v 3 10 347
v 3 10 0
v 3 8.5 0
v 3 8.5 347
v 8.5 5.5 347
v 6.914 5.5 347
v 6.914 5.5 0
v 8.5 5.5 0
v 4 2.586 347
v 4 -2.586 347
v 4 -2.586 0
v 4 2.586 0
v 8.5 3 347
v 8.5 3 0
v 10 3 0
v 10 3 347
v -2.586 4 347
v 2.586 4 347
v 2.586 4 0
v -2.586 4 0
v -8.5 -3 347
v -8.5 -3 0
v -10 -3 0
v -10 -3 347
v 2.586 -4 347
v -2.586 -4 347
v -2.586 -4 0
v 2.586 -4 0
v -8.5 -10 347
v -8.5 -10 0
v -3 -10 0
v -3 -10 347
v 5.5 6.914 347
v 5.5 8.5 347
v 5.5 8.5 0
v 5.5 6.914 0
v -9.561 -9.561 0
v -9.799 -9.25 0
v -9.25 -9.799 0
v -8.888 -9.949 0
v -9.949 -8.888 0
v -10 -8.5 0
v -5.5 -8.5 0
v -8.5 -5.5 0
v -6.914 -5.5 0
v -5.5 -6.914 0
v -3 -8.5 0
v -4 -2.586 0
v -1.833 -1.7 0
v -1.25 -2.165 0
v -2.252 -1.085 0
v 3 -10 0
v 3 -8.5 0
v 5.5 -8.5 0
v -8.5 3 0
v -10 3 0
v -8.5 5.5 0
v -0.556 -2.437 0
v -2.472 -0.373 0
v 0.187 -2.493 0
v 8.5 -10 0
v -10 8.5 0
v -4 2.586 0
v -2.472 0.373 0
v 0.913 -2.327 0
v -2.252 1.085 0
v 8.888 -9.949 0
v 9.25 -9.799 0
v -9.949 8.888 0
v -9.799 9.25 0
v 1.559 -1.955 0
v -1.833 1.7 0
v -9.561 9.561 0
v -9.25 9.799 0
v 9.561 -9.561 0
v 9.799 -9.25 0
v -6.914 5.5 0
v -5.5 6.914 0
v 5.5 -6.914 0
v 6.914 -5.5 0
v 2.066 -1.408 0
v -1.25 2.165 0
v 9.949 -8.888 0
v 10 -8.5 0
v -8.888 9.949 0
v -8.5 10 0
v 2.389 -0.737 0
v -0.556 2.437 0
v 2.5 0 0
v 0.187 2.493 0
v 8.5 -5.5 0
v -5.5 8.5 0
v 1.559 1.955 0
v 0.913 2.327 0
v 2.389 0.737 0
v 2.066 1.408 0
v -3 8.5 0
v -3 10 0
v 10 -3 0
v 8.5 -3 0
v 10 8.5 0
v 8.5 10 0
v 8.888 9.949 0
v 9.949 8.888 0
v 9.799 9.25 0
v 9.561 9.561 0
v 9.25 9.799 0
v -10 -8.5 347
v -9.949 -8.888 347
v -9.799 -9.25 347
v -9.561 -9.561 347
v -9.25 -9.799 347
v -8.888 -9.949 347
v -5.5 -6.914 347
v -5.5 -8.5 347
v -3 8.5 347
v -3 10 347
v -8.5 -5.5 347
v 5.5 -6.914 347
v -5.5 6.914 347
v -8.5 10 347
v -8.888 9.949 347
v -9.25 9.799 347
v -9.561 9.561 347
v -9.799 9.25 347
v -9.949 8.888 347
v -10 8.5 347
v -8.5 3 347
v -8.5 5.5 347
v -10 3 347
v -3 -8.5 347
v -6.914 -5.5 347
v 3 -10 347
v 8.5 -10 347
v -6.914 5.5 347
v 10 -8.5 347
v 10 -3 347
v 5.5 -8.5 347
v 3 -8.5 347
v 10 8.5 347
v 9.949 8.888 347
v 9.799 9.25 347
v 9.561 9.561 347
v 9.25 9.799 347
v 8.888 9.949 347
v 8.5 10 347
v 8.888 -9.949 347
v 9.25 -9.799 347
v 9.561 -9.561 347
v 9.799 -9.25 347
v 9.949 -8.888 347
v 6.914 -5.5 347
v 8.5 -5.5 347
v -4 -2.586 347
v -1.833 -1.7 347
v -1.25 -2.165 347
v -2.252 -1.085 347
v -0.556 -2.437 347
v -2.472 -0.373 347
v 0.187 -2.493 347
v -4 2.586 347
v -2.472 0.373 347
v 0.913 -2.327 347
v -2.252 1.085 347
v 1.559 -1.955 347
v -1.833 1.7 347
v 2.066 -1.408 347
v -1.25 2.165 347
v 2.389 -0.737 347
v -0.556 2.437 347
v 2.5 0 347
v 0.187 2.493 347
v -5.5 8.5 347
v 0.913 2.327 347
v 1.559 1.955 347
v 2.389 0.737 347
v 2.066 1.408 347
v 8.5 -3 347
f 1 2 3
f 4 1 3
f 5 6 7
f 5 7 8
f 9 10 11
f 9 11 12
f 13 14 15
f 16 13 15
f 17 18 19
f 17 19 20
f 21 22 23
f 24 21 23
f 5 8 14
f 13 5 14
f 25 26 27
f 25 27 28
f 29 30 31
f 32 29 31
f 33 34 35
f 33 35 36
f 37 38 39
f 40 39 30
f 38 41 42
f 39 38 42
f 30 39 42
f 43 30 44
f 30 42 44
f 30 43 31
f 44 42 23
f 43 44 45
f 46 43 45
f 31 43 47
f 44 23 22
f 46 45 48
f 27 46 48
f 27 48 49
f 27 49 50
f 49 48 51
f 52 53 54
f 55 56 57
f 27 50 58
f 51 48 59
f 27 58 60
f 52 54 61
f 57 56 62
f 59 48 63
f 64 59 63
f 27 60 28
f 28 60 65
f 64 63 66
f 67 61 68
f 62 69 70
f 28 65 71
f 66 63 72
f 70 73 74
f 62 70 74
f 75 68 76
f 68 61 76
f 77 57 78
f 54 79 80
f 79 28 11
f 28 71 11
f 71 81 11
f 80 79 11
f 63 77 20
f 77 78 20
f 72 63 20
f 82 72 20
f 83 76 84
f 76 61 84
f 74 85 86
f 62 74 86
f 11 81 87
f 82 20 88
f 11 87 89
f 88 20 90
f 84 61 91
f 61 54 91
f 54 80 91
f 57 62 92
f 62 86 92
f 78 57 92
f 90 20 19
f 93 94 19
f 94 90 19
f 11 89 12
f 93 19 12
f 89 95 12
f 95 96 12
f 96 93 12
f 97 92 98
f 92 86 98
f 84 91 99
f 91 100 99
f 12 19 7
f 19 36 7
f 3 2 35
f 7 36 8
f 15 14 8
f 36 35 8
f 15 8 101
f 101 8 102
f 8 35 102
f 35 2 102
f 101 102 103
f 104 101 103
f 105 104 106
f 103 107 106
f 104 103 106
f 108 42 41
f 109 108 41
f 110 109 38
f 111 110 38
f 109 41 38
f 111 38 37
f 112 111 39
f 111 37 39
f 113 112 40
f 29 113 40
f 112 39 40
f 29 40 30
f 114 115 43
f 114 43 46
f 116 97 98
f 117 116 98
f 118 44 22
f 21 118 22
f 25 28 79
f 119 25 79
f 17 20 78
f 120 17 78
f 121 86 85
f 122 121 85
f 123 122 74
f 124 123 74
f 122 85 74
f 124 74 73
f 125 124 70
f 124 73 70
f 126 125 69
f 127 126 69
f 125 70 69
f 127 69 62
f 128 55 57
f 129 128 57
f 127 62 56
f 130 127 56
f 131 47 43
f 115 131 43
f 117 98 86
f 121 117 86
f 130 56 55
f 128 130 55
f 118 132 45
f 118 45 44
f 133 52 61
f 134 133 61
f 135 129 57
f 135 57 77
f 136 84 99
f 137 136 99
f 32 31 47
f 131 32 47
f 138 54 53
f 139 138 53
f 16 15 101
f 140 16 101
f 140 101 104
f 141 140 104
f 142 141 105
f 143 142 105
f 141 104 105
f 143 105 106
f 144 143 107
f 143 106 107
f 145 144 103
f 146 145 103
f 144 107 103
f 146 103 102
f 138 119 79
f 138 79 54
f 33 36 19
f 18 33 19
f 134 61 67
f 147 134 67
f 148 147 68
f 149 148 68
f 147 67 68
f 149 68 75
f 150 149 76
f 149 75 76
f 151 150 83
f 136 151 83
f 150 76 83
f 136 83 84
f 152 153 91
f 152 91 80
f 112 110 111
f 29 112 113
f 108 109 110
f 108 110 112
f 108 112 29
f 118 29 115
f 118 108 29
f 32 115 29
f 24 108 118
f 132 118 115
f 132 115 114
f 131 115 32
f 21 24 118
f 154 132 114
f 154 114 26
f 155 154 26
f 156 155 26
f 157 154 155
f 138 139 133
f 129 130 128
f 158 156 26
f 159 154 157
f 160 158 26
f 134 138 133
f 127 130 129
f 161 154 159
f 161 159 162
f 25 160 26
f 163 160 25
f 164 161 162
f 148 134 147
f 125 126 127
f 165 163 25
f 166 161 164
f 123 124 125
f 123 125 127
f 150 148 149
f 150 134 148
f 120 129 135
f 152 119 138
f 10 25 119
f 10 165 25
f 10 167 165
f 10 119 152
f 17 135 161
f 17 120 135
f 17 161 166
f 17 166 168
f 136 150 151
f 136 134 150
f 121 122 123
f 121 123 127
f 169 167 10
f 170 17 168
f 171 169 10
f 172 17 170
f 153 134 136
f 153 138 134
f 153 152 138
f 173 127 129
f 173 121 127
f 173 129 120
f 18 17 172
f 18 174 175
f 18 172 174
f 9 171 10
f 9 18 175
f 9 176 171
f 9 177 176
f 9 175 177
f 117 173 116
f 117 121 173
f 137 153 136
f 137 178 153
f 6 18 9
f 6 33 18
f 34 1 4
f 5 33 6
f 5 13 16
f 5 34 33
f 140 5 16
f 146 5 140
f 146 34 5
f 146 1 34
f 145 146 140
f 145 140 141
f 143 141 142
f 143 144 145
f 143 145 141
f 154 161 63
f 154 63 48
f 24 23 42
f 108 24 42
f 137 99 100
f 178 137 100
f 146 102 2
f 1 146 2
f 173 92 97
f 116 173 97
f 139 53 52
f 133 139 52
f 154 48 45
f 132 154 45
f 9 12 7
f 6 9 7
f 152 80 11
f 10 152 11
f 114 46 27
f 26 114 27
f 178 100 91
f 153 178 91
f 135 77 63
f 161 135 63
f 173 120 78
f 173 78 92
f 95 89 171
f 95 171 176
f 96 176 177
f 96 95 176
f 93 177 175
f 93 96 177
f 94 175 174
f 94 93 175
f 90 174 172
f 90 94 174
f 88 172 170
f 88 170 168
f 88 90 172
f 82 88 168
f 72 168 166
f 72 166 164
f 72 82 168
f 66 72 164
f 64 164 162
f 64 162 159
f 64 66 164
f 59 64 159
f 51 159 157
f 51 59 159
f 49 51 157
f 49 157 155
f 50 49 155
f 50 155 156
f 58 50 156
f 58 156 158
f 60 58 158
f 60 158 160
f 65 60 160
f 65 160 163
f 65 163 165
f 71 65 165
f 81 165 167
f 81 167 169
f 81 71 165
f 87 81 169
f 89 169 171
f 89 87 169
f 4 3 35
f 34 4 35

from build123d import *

# Parameters (mm, degrees)
SKETCH1_R           = 2.5
BOSS_EXTRUDE1_DEPTH = 347


with BuildPart() as part:
    # Sketch1 → Boss-Extrude1 (new body)
    with BuildSketch(Plane.XY):
        with BuildLine():
            Line((-2.585786438, 4), (-5.5, 6.914213562))
            Line((-5.5, 6.914213562), (-5.5, 8.5))
            Line((-5.5, 8.5), (-3, 8.5))
            Line((-3, 8.5), (-3, 10))
            Line((-3, 10), (-8.5, 10))
            ThreePointArc((-8.5, 10), (-9.560660172, 9.560660172), (-10, 8.5))
            Line((-10, 8.5), (-10, 3))
            Line((-10, 3), (-8.5, 3))
            Line((-8.5, 3), (-8.5, 5.5))
            Line((-8.5, 5.5), (-6.914213562, 5.5))
            Line((-6.914213562, 5.5), (-4, 2.585786438))
            Line((-4, 2.585786438), (-4, -2.585786438))
            Line((-4, -2.585786438), (-6.914213562, -5.5))
            Line((-6.914213562, -5.5), (-8.5, -5.5))
            Line((-8.5, -5.5), (-8.5, -3))
            Line((-8.5, -3), (-10, -3))
            Line((-10, -3), (-10, -8.5))
            ThreePointArc((-10, -8.5), (-9.560660172, -9.560660172), (-8.5, -10))
            Line((-8.5, -10), (-3, -10))
            Line((-3, -10), (-3, -8.5))
            Line((-3, -8.5), (-5.5, -8.5))
            Line((-5.5, -8.5), (-5.5, -6.914213562))
            Line((-5.5, -6.914213562), (-2.585786438, -4))
            Line((-2.585786438, -4), (2.585786438, -4))
            Line((2.585786438, -4), (5.5, -6.914213562))
            Line((5.5, -6.914213562), (5.5, -8.5))
            Line((5.5, -8.5), (3, -8.5))
            Line((3, -8.5), (3, -10))
            Line((3, -10), (8.5, -10))
            ThreePointArc((8.5, -10), (9.560660172, -9.560660172), (10, -8.5))
            Line((10, -8.5), (10, -3))
            Line((10, -3), (8.5, -3))
            Line((8.5, -3), (8.5, -5.5))
            Line((8.5, -5.5), (6.914213562, -5.5))
            Line((6.914213562, -5.5), (4, -2.585786438))
            Line((4, -2.585786438), (4, 2.585786438))
            Line((4, 2.585786438), (6.914213562, 5.5))
            Line((6.914213562, 5.5), (8.5, 5.5))
            Line((8.5, 5.5), (8.5, 3))
            Line((8.5, 3), (10, 3))
            Line((10, 3), (10, 8.5))
            ThreePointArc((10, 8.5), (9.560660172, 9.560660172), (8.5, 10))
            Line((8.5, 10), (3, 10))
            Line((3, 10), (3, 8.5))
            Line((3, 8.5), (5.5, 8.5))
            Line((5.5, 8.5), (5.5, 6.914213562))
            Line((5.5, 6.914213562), (2.585786438, 4))
            Line((2.585786438, 4), (-2.585786438, 4))
        make_face()
        Circle(SKETCH1_R, mode=Mode.SUBTRACT)
    extrude(amount=BOSS_EXTRUDE1_DEPTH)


solid = part.part
